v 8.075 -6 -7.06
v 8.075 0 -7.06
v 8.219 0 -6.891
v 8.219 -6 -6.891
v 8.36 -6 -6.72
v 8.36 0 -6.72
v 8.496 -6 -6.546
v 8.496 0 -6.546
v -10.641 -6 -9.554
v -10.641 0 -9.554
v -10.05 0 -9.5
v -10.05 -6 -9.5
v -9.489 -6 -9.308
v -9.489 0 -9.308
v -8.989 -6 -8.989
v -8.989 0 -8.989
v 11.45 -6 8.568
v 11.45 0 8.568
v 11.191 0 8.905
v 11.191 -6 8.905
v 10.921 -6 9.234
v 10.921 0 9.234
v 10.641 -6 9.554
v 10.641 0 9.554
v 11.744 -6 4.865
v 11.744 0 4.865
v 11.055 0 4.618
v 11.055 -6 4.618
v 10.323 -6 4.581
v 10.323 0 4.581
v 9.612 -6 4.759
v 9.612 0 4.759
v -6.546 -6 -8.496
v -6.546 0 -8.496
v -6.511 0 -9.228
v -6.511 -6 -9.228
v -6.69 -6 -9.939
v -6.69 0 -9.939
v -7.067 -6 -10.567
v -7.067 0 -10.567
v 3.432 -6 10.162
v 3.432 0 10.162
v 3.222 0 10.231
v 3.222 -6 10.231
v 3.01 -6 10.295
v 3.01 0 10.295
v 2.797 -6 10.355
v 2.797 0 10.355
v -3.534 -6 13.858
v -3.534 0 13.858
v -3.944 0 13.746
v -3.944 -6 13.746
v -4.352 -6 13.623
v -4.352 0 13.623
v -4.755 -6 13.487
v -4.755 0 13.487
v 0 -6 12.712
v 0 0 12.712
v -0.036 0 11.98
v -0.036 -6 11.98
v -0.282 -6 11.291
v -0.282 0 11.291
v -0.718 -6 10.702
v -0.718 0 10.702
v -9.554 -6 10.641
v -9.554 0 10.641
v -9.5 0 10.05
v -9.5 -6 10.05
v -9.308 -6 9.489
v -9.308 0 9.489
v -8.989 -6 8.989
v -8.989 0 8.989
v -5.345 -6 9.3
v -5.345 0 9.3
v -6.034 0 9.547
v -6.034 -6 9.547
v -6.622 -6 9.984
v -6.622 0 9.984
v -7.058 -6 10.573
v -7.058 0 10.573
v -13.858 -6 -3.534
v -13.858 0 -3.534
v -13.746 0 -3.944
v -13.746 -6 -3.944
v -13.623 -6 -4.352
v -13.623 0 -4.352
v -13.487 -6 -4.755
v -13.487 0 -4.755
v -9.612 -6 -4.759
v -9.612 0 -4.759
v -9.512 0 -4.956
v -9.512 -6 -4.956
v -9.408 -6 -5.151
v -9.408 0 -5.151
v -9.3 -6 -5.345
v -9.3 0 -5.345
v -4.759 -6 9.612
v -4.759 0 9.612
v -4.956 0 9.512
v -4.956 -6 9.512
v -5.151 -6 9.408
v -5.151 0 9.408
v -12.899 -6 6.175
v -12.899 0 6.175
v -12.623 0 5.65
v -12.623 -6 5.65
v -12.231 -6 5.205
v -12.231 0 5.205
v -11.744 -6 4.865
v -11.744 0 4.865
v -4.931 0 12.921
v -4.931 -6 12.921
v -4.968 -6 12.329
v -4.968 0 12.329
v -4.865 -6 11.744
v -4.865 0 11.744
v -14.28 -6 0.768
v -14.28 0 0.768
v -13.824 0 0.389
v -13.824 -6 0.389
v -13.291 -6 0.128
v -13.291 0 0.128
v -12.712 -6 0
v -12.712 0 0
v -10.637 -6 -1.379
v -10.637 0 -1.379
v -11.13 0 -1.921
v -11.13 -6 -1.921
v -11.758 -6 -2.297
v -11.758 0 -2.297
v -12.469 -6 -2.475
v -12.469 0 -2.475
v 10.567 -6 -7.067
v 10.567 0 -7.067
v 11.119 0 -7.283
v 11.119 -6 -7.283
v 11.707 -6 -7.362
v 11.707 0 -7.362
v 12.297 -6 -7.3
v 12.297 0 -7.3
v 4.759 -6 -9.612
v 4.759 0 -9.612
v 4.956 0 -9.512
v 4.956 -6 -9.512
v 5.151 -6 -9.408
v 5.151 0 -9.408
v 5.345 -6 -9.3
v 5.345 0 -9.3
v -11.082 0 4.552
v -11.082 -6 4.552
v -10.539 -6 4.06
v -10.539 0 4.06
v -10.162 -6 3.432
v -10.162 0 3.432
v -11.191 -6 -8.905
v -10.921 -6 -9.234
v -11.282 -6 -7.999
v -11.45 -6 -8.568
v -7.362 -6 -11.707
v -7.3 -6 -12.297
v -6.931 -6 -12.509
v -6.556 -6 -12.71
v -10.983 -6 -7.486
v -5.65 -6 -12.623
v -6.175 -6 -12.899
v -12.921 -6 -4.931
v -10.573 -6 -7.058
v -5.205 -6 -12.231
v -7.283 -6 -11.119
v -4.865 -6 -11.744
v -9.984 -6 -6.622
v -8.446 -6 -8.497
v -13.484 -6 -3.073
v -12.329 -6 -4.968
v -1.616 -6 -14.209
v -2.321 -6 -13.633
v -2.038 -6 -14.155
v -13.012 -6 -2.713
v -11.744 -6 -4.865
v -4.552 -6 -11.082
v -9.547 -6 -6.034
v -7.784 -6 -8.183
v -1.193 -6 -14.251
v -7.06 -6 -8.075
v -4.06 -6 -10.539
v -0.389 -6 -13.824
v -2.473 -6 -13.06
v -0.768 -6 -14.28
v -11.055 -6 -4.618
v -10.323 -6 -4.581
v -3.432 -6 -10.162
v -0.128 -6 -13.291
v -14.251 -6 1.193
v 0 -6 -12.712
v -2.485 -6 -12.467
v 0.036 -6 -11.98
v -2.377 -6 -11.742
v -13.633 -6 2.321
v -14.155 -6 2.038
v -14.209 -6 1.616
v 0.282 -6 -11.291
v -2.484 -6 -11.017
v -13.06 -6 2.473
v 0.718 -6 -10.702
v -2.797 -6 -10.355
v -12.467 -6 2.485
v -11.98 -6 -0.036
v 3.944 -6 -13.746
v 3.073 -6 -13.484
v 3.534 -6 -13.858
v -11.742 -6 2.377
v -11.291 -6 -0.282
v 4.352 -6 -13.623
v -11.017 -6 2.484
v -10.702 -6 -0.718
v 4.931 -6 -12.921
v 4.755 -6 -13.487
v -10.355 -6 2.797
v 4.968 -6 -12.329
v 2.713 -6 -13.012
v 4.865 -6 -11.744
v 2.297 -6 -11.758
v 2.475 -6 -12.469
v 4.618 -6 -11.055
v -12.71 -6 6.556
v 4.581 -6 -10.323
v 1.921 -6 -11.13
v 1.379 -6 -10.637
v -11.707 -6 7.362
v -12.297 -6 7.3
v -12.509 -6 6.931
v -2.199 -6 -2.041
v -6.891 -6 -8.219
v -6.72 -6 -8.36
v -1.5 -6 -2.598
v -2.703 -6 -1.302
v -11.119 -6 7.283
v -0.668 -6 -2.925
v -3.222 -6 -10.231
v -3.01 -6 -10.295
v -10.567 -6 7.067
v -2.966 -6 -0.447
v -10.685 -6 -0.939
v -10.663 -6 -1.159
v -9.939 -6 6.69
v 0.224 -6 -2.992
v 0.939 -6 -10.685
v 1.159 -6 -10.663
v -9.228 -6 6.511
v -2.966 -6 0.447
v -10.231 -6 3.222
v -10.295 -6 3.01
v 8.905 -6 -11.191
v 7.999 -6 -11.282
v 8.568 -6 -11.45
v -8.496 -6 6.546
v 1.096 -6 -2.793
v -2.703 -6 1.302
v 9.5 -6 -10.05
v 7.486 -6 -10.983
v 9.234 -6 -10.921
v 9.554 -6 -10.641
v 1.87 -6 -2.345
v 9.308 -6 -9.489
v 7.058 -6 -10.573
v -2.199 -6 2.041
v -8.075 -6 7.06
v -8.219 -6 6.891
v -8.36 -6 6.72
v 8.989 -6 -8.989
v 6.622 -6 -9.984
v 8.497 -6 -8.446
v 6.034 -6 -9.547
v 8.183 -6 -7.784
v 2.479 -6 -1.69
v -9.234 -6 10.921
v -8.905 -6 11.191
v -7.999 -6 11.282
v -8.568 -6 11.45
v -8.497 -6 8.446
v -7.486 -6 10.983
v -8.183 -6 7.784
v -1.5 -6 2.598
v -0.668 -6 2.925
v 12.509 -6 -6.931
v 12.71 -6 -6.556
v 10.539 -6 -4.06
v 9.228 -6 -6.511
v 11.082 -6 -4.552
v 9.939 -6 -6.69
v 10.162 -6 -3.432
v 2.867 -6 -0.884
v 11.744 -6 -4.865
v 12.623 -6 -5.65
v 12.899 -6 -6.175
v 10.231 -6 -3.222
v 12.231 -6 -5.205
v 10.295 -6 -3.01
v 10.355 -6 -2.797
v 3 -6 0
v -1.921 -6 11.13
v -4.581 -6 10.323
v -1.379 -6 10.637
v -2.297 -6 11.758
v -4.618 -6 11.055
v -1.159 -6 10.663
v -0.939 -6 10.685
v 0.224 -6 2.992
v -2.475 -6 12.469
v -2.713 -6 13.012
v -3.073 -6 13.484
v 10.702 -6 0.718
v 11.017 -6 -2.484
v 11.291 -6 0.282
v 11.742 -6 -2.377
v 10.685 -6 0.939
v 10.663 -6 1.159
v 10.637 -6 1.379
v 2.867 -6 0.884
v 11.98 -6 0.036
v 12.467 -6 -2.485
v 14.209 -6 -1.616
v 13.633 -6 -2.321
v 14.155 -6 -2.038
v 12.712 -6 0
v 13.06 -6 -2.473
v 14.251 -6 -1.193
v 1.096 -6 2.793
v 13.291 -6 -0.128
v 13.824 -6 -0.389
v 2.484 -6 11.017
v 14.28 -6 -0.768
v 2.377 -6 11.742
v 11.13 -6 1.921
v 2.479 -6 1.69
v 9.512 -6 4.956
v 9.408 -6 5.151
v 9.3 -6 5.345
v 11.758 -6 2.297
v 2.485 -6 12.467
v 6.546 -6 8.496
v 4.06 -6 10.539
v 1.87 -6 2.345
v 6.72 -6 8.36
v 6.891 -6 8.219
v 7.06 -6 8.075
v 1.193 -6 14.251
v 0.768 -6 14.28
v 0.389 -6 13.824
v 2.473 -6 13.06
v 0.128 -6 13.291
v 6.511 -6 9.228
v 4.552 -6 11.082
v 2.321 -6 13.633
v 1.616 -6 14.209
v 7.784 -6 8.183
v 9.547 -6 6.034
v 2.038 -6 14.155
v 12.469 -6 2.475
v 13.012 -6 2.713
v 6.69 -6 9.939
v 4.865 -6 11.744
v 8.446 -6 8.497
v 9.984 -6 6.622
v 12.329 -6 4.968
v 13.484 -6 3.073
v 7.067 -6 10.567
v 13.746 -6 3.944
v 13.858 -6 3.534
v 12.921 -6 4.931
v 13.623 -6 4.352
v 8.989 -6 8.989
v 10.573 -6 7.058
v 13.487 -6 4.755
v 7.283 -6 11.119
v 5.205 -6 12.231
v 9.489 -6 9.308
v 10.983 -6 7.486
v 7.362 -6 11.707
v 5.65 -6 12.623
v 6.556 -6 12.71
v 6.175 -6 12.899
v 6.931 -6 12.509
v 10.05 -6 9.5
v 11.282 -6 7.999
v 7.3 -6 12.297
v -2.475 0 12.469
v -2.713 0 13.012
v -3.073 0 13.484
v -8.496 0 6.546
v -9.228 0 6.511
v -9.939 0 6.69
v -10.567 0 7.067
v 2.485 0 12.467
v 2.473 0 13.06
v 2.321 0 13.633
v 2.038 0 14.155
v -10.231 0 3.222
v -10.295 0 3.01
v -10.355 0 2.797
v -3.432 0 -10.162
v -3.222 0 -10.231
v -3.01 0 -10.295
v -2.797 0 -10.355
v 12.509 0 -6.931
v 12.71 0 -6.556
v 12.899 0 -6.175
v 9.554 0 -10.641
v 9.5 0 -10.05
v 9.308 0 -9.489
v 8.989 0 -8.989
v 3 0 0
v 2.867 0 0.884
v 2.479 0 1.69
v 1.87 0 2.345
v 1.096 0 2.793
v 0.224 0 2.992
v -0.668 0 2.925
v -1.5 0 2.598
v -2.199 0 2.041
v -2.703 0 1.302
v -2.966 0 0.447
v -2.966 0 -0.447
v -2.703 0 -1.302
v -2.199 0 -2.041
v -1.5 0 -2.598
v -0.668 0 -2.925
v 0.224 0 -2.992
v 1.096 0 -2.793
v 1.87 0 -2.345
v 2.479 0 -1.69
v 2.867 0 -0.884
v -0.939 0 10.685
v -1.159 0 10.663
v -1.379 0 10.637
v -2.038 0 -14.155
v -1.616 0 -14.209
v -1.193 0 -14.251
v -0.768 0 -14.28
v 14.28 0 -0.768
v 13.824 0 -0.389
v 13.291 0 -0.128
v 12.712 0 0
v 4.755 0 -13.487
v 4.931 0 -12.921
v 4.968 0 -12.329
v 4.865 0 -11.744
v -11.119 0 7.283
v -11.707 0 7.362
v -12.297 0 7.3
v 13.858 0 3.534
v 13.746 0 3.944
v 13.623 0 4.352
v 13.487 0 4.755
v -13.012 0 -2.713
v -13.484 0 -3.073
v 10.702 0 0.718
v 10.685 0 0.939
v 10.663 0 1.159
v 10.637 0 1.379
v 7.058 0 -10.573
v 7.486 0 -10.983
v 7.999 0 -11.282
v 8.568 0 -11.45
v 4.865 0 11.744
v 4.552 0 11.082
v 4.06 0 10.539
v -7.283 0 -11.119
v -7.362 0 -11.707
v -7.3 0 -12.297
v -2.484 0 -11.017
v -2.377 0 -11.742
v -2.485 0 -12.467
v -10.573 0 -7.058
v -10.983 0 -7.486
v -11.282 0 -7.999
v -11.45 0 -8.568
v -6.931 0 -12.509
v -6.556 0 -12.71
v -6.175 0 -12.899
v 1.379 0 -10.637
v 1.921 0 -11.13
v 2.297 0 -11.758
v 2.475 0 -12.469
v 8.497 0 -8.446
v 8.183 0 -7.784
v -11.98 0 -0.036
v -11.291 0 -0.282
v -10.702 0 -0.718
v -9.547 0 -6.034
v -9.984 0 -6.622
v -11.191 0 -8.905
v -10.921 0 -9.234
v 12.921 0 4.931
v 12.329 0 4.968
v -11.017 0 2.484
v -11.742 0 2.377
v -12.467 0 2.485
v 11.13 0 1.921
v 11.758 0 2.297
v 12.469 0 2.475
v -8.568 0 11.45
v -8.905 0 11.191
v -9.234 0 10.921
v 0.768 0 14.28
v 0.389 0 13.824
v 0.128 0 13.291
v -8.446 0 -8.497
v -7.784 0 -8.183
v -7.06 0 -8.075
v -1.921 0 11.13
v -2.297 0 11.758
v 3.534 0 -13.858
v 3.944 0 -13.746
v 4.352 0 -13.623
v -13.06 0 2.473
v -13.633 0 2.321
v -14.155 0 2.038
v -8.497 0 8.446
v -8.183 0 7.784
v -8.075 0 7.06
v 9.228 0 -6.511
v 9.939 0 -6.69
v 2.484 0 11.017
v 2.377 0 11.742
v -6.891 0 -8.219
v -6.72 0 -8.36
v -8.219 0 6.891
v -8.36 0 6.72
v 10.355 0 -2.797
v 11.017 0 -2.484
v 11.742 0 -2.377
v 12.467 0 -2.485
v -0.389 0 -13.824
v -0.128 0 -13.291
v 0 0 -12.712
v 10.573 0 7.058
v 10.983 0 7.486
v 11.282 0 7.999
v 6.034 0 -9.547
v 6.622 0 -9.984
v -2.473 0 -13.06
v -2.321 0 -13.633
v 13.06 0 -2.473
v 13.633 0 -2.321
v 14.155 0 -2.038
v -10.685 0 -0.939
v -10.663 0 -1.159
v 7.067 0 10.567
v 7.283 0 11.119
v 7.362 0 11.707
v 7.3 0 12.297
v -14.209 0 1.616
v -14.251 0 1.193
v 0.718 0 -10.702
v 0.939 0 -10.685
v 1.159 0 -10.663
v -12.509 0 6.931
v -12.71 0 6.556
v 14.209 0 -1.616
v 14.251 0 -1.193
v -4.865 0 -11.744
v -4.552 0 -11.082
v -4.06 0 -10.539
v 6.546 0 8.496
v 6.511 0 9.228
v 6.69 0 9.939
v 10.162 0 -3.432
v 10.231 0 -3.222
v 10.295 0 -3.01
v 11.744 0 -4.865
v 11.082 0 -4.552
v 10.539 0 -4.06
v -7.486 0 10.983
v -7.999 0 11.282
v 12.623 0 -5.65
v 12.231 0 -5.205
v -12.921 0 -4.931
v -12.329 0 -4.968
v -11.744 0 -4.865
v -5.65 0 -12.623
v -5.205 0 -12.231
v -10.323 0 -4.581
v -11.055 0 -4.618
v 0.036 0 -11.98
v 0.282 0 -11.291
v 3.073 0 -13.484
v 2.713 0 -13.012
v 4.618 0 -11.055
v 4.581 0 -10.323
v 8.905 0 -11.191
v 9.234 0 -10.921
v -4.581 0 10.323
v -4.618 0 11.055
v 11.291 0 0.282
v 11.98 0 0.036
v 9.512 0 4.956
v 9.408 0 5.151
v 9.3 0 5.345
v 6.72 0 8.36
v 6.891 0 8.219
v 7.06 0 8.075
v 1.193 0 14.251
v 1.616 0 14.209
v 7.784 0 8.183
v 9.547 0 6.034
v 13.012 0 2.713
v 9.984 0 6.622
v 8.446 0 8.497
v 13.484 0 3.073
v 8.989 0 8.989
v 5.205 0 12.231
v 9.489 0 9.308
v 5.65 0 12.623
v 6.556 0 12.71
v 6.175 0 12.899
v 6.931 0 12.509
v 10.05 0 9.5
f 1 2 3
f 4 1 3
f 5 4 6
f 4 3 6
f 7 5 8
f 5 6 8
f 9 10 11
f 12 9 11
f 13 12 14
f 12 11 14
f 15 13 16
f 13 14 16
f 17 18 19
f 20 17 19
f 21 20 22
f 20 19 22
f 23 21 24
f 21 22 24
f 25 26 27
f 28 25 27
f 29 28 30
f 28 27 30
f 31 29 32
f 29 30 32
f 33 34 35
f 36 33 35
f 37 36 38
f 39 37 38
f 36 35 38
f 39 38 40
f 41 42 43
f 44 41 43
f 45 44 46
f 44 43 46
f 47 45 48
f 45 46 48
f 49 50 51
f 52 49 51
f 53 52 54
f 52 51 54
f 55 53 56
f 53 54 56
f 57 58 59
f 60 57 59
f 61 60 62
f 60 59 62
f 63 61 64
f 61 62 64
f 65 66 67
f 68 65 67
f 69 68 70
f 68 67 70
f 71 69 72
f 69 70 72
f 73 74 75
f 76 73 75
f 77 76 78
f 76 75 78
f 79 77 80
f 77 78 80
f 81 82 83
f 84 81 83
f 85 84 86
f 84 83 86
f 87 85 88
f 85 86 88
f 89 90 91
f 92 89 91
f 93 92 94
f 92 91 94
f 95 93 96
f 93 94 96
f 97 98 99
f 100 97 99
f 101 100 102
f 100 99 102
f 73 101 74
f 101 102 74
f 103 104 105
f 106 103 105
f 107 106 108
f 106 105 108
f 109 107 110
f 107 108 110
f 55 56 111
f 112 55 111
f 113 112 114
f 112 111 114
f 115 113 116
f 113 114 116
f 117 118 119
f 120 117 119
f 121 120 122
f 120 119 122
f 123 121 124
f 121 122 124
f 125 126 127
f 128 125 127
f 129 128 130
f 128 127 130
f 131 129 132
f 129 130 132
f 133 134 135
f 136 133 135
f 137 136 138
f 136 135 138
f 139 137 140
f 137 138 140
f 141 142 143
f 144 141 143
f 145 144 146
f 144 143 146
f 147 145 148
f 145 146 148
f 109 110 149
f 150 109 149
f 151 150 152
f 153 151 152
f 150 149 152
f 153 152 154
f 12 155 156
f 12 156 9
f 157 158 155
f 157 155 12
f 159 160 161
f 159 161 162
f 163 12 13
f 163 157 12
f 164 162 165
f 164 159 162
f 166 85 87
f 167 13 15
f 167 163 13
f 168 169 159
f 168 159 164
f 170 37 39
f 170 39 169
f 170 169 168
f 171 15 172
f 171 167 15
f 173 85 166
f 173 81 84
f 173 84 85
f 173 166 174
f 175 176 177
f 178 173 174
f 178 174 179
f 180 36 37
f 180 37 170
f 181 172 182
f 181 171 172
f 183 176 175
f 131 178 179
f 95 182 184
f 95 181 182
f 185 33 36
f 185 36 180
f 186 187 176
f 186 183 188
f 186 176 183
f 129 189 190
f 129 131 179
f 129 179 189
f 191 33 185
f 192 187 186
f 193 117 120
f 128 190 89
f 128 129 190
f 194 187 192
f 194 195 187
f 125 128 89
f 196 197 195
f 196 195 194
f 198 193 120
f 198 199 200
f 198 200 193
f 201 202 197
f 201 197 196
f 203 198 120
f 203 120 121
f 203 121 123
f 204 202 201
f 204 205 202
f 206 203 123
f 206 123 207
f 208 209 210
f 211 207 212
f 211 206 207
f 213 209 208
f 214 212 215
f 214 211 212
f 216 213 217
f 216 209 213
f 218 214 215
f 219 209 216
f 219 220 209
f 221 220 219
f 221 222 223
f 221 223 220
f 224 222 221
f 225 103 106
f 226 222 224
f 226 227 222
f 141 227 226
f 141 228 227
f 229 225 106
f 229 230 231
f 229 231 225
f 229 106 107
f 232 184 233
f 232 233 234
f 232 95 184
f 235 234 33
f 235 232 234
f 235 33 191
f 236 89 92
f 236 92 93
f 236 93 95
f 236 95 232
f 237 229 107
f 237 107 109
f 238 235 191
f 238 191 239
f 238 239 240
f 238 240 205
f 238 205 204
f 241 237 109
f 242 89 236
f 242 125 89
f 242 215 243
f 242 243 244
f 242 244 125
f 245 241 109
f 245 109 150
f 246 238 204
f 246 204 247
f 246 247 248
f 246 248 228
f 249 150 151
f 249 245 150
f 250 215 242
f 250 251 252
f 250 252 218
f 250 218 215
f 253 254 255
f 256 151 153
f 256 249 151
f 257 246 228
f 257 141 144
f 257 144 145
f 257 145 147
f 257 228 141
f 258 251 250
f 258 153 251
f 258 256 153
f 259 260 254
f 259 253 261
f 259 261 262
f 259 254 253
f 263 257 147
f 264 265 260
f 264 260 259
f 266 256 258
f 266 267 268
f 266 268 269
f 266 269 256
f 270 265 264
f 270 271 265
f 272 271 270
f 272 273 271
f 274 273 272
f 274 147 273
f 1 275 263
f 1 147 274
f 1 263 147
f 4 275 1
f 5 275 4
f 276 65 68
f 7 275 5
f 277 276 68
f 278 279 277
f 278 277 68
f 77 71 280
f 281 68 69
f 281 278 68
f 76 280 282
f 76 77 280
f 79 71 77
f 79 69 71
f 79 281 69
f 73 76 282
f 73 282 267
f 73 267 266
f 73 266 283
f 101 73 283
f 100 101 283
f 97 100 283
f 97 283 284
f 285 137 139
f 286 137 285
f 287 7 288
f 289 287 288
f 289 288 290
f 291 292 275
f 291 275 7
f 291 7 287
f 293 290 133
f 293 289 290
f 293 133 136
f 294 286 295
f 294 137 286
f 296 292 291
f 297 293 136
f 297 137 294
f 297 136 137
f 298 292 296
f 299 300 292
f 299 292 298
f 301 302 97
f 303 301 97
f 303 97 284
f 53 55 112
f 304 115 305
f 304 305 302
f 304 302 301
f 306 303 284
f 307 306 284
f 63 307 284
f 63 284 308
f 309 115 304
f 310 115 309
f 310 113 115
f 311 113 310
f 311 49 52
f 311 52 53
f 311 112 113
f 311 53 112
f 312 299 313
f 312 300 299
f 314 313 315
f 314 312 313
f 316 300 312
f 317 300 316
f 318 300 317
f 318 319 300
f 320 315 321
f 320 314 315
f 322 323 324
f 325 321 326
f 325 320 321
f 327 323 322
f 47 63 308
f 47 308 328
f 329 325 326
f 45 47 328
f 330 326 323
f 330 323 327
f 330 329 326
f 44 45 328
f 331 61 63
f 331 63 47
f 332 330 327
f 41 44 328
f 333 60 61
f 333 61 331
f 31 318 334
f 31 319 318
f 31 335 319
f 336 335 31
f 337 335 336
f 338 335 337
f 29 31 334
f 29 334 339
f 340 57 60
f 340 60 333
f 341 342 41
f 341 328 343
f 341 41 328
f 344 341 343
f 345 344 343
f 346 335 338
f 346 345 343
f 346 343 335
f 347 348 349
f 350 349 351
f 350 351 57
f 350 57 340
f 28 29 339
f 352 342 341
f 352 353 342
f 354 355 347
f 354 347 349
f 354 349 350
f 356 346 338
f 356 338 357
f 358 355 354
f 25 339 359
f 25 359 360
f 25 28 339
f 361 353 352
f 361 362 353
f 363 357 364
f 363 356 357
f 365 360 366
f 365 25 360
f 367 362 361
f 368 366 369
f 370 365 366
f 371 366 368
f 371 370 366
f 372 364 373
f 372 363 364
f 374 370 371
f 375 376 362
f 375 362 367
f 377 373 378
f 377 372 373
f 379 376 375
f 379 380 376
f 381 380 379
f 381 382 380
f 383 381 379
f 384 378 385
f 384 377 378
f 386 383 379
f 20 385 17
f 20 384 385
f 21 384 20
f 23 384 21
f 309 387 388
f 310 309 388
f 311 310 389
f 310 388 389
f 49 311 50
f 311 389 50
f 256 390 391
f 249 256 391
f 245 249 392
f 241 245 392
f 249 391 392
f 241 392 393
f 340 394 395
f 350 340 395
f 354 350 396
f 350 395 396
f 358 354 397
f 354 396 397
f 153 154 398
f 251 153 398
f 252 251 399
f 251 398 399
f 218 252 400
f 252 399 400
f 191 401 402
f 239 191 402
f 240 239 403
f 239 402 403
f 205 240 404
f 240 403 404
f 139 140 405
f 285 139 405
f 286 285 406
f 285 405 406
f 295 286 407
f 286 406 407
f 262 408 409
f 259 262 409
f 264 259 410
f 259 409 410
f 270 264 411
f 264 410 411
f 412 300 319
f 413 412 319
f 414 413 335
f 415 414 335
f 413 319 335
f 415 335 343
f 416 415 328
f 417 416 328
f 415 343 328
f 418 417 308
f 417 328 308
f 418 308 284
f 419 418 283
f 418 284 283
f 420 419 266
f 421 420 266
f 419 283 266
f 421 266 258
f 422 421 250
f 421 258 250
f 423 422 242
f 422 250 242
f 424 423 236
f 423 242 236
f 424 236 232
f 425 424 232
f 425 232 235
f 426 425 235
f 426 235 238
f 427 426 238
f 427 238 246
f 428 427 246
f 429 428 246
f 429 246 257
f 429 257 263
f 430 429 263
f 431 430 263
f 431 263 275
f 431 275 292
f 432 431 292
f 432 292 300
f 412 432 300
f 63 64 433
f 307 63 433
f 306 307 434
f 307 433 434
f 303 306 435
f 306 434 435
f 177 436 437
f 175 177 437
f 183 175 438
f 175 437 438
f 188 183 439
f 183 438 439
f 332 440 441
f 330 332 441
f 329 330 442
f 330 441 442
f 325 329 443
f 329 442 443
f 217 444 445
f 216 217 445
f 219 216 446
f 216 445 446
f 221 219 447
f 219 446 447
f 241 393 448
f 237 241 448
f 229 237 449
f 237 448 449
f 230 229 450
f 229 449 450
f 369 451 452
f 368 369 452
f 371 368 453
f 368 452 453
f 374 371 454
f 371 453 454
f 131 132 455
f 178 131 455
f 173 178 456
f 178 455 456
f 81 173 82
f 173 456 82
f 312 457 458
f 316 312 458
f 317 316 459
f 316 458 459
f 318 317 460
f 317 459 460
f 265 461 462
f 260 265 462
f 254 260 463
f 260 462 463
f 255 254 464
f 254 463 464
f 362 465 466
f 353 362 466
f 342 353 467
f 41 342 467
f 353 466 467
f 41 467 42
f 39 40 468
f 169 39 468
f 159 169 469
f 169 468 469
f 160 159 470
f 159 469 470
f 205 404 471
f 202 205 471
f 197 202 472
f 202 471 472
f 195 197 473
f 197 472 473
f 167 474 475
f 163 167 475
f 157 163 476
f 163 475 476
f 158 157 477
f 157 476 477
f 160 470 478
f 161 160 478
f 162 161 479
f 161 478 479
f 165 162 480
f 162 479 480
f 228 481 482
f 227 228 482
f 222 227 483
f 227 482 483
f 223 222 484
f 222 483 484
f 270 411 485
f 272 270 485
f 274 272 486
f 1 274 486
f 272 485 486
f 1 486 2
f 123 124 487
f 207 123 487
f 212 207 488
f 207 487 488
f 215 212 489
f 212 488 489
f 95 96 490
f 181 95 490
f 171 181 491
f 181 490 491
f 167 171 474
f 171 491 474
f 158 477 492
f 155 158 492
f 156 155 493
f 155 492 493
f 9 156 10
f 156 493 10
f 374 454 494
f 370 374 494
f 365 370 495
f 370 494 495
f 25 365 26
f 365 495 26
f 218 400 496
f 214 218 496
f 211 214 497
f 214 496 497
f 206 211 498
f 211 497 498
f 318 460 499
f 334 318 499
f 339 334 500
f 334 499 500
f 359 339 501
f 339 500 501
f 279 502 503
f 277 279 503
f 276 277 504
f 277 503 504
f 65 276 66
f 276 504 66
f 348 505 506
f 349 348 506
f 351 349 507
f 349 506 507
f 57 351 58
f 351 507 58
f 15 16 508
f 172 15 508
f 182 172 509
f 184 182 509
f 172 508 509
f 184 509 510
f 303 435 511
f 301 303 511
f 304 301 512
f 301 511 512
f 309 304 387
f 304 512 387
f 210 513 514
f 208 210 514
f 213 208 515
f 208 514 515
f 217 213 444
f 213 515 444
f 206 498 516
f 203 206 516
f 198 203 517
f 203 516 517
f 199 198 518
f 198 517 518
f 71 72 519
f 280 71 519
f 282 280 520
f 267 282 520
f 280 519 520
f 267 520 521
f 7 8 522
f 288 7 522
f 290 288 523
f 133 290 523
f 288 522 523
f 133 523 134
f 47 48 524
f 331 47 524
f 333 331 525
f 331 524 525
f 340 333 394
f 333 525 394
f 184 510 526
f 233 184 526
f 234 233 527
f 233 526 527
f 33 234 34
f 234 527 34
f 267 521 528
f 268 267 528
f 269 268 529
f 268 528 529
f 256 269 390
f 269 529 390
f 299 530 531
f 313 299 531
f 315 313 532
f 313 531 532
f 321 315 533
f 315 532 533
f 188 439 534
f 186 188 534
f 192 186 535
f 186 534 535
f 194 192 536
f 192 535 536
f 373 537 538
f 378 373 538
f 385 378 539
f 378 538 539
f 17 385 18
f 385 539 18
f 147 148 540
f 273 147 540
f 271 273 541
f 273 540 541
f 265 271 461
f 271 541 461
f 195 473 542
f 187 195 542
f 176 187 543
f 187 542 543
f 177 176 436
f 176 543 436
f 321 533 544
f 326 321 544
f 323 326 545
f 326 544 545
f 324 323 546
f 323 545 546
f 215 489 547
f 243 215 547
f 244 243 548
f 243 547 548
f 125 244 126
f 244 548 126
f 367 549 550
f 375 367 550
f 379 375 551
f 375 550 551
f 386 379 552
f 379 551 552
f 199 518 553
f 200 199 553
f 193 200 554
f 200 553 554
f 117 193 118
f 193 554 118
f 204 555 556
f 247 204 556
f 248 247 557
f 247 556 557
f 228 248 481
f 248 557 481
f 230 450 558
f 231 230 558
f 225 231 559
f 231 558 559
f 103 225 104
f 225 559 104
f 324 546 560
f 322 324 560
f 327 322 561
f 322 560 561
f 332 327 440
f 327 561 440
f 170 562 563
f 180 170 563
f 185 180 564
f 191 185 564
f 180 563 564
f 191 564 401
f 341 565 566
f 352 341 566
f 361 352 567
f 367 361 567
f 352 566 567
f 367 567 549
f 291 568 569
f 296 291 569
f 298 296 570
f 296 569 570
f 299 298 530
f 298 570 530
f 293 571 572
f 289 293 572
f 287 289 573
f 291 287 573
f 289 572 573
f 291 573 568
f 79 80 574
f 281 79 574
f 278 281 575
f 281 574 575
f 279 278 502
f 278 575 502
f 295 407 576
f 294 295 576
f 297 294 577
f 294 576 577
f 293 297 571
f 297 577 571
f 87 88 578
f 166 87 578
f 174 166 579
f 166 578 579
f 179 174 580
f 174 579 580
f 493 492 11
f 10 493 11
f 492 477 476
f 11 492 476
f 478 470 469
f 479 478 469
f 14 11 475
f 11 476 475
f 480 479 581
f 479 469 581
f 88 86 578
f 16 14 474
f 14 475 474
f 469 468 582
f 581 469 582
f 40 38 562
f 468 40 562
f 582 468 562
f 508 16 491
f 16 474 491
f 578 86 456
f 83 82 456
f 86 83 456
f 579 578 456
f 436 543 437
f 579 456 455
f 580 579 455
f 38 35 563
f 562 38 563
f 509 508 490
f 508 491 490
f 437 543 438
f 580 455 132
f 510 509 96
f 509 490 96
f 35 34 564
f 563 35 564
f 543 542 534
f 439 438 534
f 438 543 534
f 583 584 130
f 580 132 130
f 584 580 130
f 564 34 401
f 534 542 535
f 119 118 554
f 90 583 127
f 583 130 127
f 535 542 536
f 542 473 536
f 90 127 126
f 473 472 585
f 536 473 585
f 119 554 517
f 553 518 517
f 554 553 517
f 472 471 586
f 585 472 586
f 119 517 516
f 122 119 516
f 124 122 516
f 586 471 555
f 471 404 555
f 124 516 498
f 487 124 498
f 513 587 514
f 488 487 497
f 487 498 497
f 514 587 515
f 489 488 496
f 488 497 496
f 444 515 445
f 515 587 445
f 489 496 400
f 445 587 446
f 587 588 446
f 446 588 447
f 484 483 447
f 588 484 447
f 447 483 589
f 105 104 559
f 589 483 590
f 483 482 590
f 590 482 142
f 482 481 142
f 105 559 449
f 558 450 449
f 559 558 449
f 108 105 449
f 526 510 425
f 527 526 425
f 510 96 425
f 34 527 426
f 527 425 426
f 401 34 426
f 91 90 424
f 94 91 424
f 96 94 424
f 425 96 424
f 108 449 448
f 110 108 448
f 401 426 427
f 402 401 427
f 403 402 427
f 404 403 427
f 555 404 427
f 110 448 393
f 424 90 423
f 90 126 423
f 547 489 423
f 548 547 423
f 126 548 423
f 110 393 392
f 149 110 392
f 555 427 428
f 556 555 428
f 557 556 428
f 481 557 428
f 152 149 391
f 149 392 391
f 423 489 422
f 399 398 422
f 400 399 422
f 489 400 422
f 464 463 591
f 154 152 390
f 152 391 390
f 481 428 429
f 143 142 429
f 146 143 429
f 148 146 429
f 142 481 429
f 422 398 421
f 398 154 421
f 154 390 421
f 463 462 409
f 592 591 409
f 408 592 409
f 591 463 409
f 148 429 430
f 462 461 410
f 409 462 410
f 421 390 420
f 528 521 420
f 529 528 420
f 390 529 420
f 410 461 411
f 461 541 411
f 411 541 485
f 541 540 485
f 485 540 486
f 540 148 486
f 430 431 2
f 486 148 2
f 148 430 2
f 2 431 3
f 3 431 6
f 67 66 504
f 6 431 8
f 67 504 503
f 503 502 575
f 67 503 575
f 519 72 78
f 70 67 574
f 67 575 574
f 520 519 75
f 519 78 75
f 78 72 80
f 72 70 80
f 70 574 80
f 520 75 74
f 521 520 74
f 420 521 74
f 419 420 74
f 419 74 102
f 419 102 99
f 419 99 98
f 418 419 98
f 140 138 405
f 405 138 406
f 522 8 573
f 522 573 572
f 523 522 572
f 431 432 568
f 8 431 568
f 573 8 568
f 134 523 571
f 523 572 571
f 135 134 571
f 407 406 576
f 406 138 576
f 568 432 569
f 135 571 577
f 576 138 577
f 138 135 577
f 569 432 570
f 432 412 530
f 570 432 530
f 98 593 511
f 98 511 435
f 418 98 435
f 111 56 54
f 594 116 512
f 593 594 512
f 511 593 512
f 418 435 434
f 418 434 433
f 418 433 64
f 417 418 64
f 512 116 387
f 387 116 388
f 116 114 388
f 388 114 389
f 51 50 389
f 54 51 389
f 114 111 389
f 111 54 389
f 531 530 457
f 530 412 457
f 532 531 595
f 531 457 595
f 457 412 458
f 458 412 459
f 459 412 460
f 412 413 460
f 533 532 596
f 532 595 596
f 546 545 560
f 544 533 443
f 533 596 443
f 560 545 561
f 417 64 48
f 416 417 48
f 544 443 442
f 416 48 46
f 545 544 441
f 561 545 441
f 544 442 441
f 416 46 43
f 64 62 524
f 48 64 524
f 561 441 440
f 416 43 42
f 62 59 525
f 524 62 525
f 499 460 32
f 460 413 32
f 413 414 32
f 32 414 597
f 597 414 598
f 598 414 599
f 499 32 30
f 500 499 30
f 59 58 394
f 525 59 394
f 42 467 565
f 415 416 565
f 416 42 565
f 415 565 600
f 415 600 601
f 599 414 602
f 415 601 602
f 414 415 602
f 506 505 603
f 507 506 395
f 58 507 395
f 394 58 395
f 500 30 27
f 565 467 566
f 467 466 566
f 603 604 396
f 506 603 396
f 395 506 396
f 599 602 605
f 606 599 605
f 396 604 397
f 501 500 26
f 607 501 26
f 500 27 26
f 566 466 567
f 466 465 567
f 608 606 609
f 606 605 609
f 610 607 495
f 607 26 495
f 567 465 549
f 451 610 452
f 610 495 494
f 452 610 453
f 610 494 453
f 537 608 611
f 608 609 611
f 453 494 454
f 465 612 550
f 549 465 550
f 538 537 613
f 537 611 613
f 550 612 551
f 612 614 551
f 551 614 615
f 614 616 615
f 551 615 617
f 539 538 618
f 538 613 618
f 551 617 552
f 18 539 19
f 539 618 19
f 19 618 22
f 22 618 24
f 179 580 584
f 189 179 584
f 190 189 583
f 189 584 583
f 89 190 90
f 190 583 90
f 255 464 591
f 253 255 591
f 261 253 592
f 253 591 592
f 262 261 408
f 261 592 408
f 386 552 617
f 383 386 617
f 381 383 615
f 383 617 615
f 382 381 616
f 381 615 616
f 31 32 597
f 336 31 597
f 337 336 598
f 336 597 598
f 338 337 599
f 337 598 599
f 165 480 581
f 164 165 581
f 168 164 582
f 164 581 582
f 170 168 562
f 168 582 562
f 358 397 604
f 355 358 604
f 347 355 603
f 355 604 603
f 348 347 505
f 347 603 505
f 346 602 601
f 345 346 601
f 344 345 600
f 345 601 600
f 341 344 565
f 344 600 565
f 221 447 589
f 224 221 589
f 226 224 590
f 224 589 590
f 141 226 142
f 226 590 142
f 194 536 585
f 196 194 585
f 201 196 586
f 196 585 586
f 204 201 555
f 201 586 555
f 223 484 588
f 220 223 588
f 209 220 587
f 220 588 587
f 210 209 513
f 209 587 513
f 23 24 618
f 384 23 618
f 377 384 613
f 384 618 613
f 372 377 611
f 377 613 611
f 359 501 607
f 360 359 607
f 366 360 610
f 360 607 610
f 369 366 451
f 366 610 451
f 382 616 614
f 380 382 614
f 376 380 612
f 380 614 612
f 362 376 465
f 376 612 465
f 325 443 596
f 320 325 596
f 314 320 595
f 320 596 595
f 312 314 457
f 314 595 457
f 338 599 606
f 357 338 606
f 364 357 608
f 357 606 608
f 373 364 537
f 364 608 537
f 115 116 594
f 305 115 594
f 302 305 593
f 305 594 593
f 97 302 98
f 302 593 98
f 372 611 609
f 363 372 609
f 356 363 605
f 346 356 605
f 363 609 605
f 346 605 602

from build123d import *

# Parameters (mm, degrees)
F1_DEPTH = 6
F2_R     = 3
F3_DEPTH = 6.001


with BuildPart() as f1:
    # F0 (on Front) → F1 (new body)
    with BuildSketch(Plane.XZ):
        with BuildLine():
            ThreePointArc((2.48542, 12.466661), (2.414328, 13.351159), (2.038464, 14.154973))
            ThreePointArc((2.038464, 14.154973), (1.404844, 14.231831), (0.768425, 14.28034))
            ThreePointArc((0.768425, 14.28034), (0.242655, 13.565528), (0, 12.712))
            ThreePointArc((0, 12.712), (-0.13352, 11.62638), (-0.718152, 10.701931))
            ThreePointArc((-0.718152, 10.701931), (1.053657, 10.674122), (2.796709, 10.354974))
            ThreePointArc((2.796709, 10.354974), (2.404106, 11.375887), (2.48542, 12.466661))
        make_face()
        with BuildLine():
            ThreePointArc((3.431965, 10.16212), (3.11583, 10.263463), (2.796709, 10.354974))
            ThreePointArc((2.796709, 10.354974), (1.053657, 10.674122), (-0.718152, 10.701931))
            ThreePointArc((-0.718152, 10.701931), (-1.049006, 10.67458), (-1.378855, 10.637003))
            ThreePointArc((-1.378855, 10.637003), (-3.111357, 10.26482), (-4.758938, 9.61247))
            ThreePointArc((-4.758938, 9.61247), (-5.05414, 9.460589), (-5.344501, 9.299644))
            ThreePointArc((-5.344501, 9.299644), (-6.802696, 8.292792), (-8.075219, 7.059598))
            ThreePointArc((-8.075219, 7.059598), (-8.289827, 6.806309), (-8.496495, 6.546499))
            ThreePointArc((-8.496495, 6.546499), (-9.458386, 5.058262), (-10.16212, 3.431965))
            ThreePointArc((-10.16212, 3.431965), (-10.263463, 3.11583), (-10.354974, 2.796709))
            ThreePointArc((-10.354974, 2.796709), (-10.674122, 1.053657), (-10.701931, -0.718152))
            ThreePointArc((-10.701931, -0.718152), (-10.67458, -1.049006), (-10.637003, -1.378855))
            ThreePointArc((-10.637003, -1.378855), (-10.26482, -3.111357), (-9.61247, -4.758938))
            ThreePointArc((-9.61247, -4.758938), (-9.460589, -5.05414), (-9.299644, -5.344501))
            ThreePointArc((-9.299644, -5.344501), (-8.292792, -6.802696), (-7.059598, -8.075219))
            ThreePointArc((-7.059598, -8.075219), (-6.806309, -8.289827), (-6.546499, -8.496495))
            ThreePointArc((-6.546499, -8.496495), (-5.058262, -9.458386), (-3.431965, -10.16212))
            ThreePointArc((-3.431965, -10.16212), (-3.11583, -10.263463), (-2.796709, -10.354974))
            ThreePointArc((-2.796709, -10.354974), (-1.053657, -10.674122), (0.718152, -10.701931))
            ThreePointArc((0.718152, -10.701931), (1.049006, -10.67458), (1.378855, -10.637003))
            ThreePointArc((1.378855, -10.637003), (3.111357, -10.26482), (4.758938, -9.61247))
            ThreePointArc((4.758938, -9.61247), (5.05414, -9.460589), (5.344501, -9.299644))
            ThreePointArc((5.344501, -9.299644), (6.802696, -8.292792), (8.075219, -7.059598))
            ThreePointArc((8.075219, -7.059598), (8.289827, -6.806309), (8.496495, -6.546499))
            ThreePointArc((8.496495, -6.546499), (9.458386, -5.058262), (10.16212, -3.431965))
            ThreePointArc((10.16212, -3.431965), (10.263463, -3.11583), (10.354974, -2.796709))
            ThreePointArc((10.354974, -2.796709), (10.632839, -1.410606), (10.726, 0))
            ThreePointArc((10.726, 0), (10.719981, 0.359278), (10.701931, 0.718152))
            ThreePointArc((10.701931, 0.718152), (10.67458, 1.049006), (10.637003, 1.378855))
            ThreePointArc((10.637003, 1.378855), (10.26482, 3.111357), (9.61247, 4.758938))
            ThreePointArc((9.61247, 4.758938), (9.460589, 5.05414), (9.299644, 5.344501))
            ThreePointArc((9.299644, 5.344501), (8.292792, 6.802696), (7.059598, 8.075219))
            ThreePointArc((7.059598, 8.075219), (6.806309, 8.289827), (6.546499, 8.496495))
            ThreePointArc((6.546499, 8.496495), (5.058262, 9.458386), (3.431965, 10.16212))
        make_face()
        with BuildLine():
            ThreePointArc((4.864672, 11.744357), (4.325866, 10.79247), (3.431965, 10.16212))
            ThreePointArc((3.431965, 10.16212), (5.058262, 9.458386), (6.546499, 8.496495))
            ThreePointArc((6.546499, 8.496495), (6.574468, 9.589938), (7.067014, 10.566563))
            ThreePointArc((7.067014, 10.566563), (7.339816, 11.410939), (7.300169, 12.297404))
            ThreePointArc((7.300169, 12.297404), (6.744192, 12.610887), (6.174782, 12.899251))
            ThreePointArc((6.174782, 12.899251), (5.415487, 12.440054), (4.864672, 11.744357))
        make_face()
        with BuildLine():
            ThreePointArc((-4.758938, 9.61247), (-3.111357, 10.26482), (-1.378855, 10.637003))
            ThreePointArc((-1.378855, 10.637003), (-2.132259, 11.429961), (-2.474555, 12.468822))
            ThreePointArc((-2.474555, 12.468822), (-2.878719, 13.258786), (-3.533579, 13.857576))
            ThreePointArc((-3.533579, 13.857576), (-4.14838, 13.686108), (-4.754917, 13.487378))
            ThreePointArc((-4.754917, 13.487378), (-4.967119, 12.625774), (-4.864672, 11.744357))
            ThreePointArc((-4.864672, 11.744357), (-4.57258, 10.690278), (-4.758938, 9.61247))
        make_face()
        with BuildLine():
            ThreePointArc((8.988741, 8.988741), (8.126679, 8.315505), (7.059598, 8.075219))
            ThreePointArc((7.059598, 8.075219), (8.292792, 6.802696), (9.299644, 5.344501))
            ThreePointArc((9.299644, 5.344501), (9.743926, 6.344007), (10.572718, 7.057803))
            ThreePointArc((10.572718, 7.057803), (11.147883, 7.733507), (11.450489, 8.567666))
            ThreePointArc((11.450489, 8.567666), (11.056799, 9.07005), (10.641084, 9.554367))
            ThreePointArc((10.641084, 9.554367), (9.76386, 9.420694), (8.988741, 8.988741))
        make_face()
        with BuildLine():
            ThreePointArc((-8.075219, 7.059598), (-6.802696, 8.292792), (-5.344501, 9.299644))
            ThreePointArc((-5.344501, 9.299644), (-6.344007, 9.743926), (-7.057803, 10.572718))
            ThreePointArc((-7.057803, 10.572718), (-7.733507, 11.147883), (-8.567666, 11.450489))
            ThreePointArc((-8.567666, 11.450489), (-9.07005, 11.056799), (-9.554367, 10.641084))
            ThreePointArc((-9.554367, 10.641084), (-9.420694, 9.76386), (-8.988741, 8.988741))
            ThreePointArc((-8.988741, 8.988741), (-8.315505, 8.126679), (-8.075219, 7.059598))
        make_face()
        with BuildLine():
            ThreePointArc((11.744357, 4.864672), (10.690278, 4.57258), (9.61247, 4.758938))
            ThreePointArc((9.61247, 4.758938), (10.26482, 3.111357), (10.637003, 1.378855))
            ThreePointArc((10.637003, 1.378855), (11.429961, 2.132259), (12.468822, 2.474555))
            ThreePointArc((12.468822, 2.474555), (13.258786, 2.878719), (13.857576, 3.533579))
            ThreePointArc((13.857576, 3.533579), (13.686108, 4.14838), (13.487378, 4.754917))
            ThreePointArc((13.487378, 4.754917), (12.625774, 4.967119), (11.744357, 4.864672))
        make_face()
        with BuildLine():
            ThreePointArc((-10.16212, 3.431965), (-9.458386, 5.058262), (-8.496495, 6.546499))
            ThreePointArc((-8.496495, 6.546499), (-9.589938, 6.574468), (-10.566563, 7.067014))
            ThreePointArc((-10.566563, 7.067014), (-11.410939, 7.339816), (-12.297404, 7.300169))
            ThreePointArc((-12.297404, 7.300169), (-12.610887, 6.744192), (-12.899251, 6.174782))
            ThreePointArc((-12.899251, 6.174782), (-12.440054, 5.415487), (-11.744357, 4.864672))
            ThreePointArc((-11.744357, 4.864672), (-10.79247, 4.325866), (-10.16212, 3.431965))
        make_face()
        with BuildLine():
            ThreePointArc((12.712, 0), (11.62638, 0.13352), (10.701931, 0.718152))
            ThreePointArc((10.701931, 0.718152), (10.719981, 0.359278), (10.726, 0))
            ThreePointArc((10.726, 0), (10.632839, -1.410606), (10.354974, -2.796709))
            ThreePointArc((10.354974, -2.796709), (11.375887, -2.404106), (12.466661, -2.48542))
            ThreePointArc((12.466661, -2.48542), (13.351159, -2.414328), (14.154973, -2.038464))
            ThreePointArc((14.154973, -2.038464), (14.231831, -1.404844), (14.28034, -0.768425))
            ThreePointArc((14.28034, -0.768425), (13.565528, -0.242655), (12.712, 0))
        make_face()
        with BuildLine():
            ThreePointArc((-10.701931, -0.718152), (-10.674122, 1.053657), (-10.354974, 2.796709))
            ThreePointArc((-10.354974, 2.796709), (-11.375887, 2.404106), (-12.466661, 2.48542))
            ThreePointArc((-12.466661, 2.48542), (-13.351159, 2.414328), (-14.154973, 2.038464))
            ThreePointArc((-14.154973, 2.038464), (-14.231831, 1.404844), (-14.28034, 0.768425))
            ThreePointArc((-14.28034, 0.768425), (-13.565528, 0.242655), (-12.712, 0))
            ThreePointArc((-12.712, 0), (-11.62638, -0.13352), (-10.701931, -0.718152))
        make_face()
        with BuildLine():
            ThreePointArc((-9.61247, -4.758938), (-10.26482, -3.111357), (-10.637003, -1.378855))
            ThreePointArc((-10.637003, -1.378855), (-11.429961, -2.132259), (-12.468822, -2.474555))
            ThreePointArc((-12.468822, -2.474555), (-13.258786, -2.878719), (-13.857576, -3.533579))
            ThreePointArc((-13.857576, -3.533579), (-13.686108, -4.14838), (-13.487378, -4.754917))
            ThreePointArc((-13.487378, -4.754917), (-12.625774, -4.967119), (-11.744357, -4.864672))
            ThreePointArc((-11.744357, -4.864672), (-10.690278, -4.57258), (-9.61247, -4.758938))
        make_face()
        with BuildLine():
            ThreePointArc((11.744357, -4.864672), (10.79247, -4.325866), (10.16212, -3.431965))
            ThreePointArc((10.16212, -3.431965), (9.458386, -5.058262), (8.496495, -6.546499))
            ThreePointArc((8.496495, -6.546499), (9.589938, -6.574468), (10.566563, -7.067014))
            ThreePointArc((10.566563, -7.067014), (11.410939, -7.339816), (12.297404, -7.300169))
            ThreePointArc((12.297404, -7.300169), (12.610887, -6.744192), (12.899251, -6.174782))
            ThreePointArc((12.899251, -6.174782), (12.440054, -5.415487), (11.744357, -4.864672))
        make_face()
        with BuildLine():
            ThreePointArc((-7.059598, -8.075219), (-8.292792, -6.802696), (-9.299644, -5.344501))
            ThreePointArc((-9.299644, -5.344501), (-9.743926, -6.344007), (-10.572718, -7.057803))
            ThreePointArc((-10.572718, -7.057803), (-11.147883, -7.733507), (-11.450489, -8.567666))
            ThreePointArc((-11.450489, -8.567666), (-11.056799, -9.07005), (-10.641084, -9.554367))
            ThreePointArc((-10.641084, -9.554367), (-9.76386, -9.420694), (-8.988741, -8.988741))
            ThreePointArc((-8.988741, -8.988741), (-8.126679, -8.315505), (-7.059598, -8.075219))
        make_face()
        with BuildLine():
            ThreePointArc((8.988741, -8.988741), (8.315505, -8.126679), (8.075219, -7.059598))
            ThreePointArc((8.075219, -7.059598), (6.802696, -8.292792), (5.344501, -9.299644))
            ThreePointArc((5.344501, -9.299644), (6.344007, -9.743926), (7.057803, -10.572718))
            ThreePointArc((7.057803, -10.572718), (7.733507, -11.147883), (8.567666, -11.450489))
            ThreePointArc((8.567666, -11.450489), (9.07005, -11.056799), (9.554367, -10.641084))
            ThreePointArc((9.554367, -10.641084), (9.420694, -9.76386), (8.988741, -8.988741))
        make_face()
        with BuildLine():
            ThreePointArc((-3.431965, -10.16212), (-5.058262, -9.458386), (-6.546499, -8.496495))
            ThreePointArc((-6.546499, -8.496495), (-6.574468, -9.589938), (-7.067014, -10.566563))
            ThreePointArc((-7.067014, -10.566563), (-7.339816, -11.410939), (-7.300169, -12.297404))
            ThreePointArc((-7.300169, -12.297404), (-6.744192, -12.610887), (-6.174782, -12.899251))
            ThreePointArc((-6.174782, -12.899251), (-5.415487, -12.440054), (-4.864672, -11.744357))
            ThreePointArc((-4.864672, -11.744357), (-4.325866, -10.79247), (-3.431965, -10.16212))
        make_face()
        with BuildLine():
            ThreePointArc((4.864672, -11.744357), (4.57258, -10.690278), (4.758938, -9.61247))
            ThreePointArc((4.758938, -9.61247), (3.111357, -10.26482), (1.378855, -10.637003))
            ThreePointArc((1.378855, -10.637003), (2.132259, -11.429961), (2.474555, -12.468822))
            ThreePointArc((2.474555, -12.468822), (2.878719, -13.258786), (3.533579, -13.857576))
            ThreePointArc((3.533579, -13.857576), (4.14838, -13.686108), (4.754917, -13.487378))
            ThreePointArc((4.754917, -13.487378), (4.967119, -12.625774), (4.864672, -11.744357))
        make_face()
        with BuildLine():
            ThreePointArc((0.718152, -10.701931), (-1.053657, -10.674122), (-2.796709, -10.354974))
            ThreePointArc((-2.796709, -10.354974), (-2.404106, -11.375887), (-2.48542, -12.466661))
            ThreePointArc((-2.48542, -12.466661), (-2.414328, -13.351159), (-2.038464, -14.154973))
            ThreePointArc((-2.038464, -14.154973), (-1.404844, -14.231831), (-0.768425, -14.28034))
            ThreePointArc((-0.768425, -14.28034), (-0.242655, -13.565528), (0, -12.712))
            ThreePointArc((0, -12.712), (0.13352, -11.62638), (0.718152, -10.701931))
        make_face()
    extrude(amount=F1_DEPTH)

    # F2 (on face) → F3 (cut, through all)
    with BuildSketch(Plane.XZ.offset(6)):
        Circle(F2_R)
    extrude(amount=-F3_DEPTH, mode=Mode.SUBTRACT)


solid = f1.part
